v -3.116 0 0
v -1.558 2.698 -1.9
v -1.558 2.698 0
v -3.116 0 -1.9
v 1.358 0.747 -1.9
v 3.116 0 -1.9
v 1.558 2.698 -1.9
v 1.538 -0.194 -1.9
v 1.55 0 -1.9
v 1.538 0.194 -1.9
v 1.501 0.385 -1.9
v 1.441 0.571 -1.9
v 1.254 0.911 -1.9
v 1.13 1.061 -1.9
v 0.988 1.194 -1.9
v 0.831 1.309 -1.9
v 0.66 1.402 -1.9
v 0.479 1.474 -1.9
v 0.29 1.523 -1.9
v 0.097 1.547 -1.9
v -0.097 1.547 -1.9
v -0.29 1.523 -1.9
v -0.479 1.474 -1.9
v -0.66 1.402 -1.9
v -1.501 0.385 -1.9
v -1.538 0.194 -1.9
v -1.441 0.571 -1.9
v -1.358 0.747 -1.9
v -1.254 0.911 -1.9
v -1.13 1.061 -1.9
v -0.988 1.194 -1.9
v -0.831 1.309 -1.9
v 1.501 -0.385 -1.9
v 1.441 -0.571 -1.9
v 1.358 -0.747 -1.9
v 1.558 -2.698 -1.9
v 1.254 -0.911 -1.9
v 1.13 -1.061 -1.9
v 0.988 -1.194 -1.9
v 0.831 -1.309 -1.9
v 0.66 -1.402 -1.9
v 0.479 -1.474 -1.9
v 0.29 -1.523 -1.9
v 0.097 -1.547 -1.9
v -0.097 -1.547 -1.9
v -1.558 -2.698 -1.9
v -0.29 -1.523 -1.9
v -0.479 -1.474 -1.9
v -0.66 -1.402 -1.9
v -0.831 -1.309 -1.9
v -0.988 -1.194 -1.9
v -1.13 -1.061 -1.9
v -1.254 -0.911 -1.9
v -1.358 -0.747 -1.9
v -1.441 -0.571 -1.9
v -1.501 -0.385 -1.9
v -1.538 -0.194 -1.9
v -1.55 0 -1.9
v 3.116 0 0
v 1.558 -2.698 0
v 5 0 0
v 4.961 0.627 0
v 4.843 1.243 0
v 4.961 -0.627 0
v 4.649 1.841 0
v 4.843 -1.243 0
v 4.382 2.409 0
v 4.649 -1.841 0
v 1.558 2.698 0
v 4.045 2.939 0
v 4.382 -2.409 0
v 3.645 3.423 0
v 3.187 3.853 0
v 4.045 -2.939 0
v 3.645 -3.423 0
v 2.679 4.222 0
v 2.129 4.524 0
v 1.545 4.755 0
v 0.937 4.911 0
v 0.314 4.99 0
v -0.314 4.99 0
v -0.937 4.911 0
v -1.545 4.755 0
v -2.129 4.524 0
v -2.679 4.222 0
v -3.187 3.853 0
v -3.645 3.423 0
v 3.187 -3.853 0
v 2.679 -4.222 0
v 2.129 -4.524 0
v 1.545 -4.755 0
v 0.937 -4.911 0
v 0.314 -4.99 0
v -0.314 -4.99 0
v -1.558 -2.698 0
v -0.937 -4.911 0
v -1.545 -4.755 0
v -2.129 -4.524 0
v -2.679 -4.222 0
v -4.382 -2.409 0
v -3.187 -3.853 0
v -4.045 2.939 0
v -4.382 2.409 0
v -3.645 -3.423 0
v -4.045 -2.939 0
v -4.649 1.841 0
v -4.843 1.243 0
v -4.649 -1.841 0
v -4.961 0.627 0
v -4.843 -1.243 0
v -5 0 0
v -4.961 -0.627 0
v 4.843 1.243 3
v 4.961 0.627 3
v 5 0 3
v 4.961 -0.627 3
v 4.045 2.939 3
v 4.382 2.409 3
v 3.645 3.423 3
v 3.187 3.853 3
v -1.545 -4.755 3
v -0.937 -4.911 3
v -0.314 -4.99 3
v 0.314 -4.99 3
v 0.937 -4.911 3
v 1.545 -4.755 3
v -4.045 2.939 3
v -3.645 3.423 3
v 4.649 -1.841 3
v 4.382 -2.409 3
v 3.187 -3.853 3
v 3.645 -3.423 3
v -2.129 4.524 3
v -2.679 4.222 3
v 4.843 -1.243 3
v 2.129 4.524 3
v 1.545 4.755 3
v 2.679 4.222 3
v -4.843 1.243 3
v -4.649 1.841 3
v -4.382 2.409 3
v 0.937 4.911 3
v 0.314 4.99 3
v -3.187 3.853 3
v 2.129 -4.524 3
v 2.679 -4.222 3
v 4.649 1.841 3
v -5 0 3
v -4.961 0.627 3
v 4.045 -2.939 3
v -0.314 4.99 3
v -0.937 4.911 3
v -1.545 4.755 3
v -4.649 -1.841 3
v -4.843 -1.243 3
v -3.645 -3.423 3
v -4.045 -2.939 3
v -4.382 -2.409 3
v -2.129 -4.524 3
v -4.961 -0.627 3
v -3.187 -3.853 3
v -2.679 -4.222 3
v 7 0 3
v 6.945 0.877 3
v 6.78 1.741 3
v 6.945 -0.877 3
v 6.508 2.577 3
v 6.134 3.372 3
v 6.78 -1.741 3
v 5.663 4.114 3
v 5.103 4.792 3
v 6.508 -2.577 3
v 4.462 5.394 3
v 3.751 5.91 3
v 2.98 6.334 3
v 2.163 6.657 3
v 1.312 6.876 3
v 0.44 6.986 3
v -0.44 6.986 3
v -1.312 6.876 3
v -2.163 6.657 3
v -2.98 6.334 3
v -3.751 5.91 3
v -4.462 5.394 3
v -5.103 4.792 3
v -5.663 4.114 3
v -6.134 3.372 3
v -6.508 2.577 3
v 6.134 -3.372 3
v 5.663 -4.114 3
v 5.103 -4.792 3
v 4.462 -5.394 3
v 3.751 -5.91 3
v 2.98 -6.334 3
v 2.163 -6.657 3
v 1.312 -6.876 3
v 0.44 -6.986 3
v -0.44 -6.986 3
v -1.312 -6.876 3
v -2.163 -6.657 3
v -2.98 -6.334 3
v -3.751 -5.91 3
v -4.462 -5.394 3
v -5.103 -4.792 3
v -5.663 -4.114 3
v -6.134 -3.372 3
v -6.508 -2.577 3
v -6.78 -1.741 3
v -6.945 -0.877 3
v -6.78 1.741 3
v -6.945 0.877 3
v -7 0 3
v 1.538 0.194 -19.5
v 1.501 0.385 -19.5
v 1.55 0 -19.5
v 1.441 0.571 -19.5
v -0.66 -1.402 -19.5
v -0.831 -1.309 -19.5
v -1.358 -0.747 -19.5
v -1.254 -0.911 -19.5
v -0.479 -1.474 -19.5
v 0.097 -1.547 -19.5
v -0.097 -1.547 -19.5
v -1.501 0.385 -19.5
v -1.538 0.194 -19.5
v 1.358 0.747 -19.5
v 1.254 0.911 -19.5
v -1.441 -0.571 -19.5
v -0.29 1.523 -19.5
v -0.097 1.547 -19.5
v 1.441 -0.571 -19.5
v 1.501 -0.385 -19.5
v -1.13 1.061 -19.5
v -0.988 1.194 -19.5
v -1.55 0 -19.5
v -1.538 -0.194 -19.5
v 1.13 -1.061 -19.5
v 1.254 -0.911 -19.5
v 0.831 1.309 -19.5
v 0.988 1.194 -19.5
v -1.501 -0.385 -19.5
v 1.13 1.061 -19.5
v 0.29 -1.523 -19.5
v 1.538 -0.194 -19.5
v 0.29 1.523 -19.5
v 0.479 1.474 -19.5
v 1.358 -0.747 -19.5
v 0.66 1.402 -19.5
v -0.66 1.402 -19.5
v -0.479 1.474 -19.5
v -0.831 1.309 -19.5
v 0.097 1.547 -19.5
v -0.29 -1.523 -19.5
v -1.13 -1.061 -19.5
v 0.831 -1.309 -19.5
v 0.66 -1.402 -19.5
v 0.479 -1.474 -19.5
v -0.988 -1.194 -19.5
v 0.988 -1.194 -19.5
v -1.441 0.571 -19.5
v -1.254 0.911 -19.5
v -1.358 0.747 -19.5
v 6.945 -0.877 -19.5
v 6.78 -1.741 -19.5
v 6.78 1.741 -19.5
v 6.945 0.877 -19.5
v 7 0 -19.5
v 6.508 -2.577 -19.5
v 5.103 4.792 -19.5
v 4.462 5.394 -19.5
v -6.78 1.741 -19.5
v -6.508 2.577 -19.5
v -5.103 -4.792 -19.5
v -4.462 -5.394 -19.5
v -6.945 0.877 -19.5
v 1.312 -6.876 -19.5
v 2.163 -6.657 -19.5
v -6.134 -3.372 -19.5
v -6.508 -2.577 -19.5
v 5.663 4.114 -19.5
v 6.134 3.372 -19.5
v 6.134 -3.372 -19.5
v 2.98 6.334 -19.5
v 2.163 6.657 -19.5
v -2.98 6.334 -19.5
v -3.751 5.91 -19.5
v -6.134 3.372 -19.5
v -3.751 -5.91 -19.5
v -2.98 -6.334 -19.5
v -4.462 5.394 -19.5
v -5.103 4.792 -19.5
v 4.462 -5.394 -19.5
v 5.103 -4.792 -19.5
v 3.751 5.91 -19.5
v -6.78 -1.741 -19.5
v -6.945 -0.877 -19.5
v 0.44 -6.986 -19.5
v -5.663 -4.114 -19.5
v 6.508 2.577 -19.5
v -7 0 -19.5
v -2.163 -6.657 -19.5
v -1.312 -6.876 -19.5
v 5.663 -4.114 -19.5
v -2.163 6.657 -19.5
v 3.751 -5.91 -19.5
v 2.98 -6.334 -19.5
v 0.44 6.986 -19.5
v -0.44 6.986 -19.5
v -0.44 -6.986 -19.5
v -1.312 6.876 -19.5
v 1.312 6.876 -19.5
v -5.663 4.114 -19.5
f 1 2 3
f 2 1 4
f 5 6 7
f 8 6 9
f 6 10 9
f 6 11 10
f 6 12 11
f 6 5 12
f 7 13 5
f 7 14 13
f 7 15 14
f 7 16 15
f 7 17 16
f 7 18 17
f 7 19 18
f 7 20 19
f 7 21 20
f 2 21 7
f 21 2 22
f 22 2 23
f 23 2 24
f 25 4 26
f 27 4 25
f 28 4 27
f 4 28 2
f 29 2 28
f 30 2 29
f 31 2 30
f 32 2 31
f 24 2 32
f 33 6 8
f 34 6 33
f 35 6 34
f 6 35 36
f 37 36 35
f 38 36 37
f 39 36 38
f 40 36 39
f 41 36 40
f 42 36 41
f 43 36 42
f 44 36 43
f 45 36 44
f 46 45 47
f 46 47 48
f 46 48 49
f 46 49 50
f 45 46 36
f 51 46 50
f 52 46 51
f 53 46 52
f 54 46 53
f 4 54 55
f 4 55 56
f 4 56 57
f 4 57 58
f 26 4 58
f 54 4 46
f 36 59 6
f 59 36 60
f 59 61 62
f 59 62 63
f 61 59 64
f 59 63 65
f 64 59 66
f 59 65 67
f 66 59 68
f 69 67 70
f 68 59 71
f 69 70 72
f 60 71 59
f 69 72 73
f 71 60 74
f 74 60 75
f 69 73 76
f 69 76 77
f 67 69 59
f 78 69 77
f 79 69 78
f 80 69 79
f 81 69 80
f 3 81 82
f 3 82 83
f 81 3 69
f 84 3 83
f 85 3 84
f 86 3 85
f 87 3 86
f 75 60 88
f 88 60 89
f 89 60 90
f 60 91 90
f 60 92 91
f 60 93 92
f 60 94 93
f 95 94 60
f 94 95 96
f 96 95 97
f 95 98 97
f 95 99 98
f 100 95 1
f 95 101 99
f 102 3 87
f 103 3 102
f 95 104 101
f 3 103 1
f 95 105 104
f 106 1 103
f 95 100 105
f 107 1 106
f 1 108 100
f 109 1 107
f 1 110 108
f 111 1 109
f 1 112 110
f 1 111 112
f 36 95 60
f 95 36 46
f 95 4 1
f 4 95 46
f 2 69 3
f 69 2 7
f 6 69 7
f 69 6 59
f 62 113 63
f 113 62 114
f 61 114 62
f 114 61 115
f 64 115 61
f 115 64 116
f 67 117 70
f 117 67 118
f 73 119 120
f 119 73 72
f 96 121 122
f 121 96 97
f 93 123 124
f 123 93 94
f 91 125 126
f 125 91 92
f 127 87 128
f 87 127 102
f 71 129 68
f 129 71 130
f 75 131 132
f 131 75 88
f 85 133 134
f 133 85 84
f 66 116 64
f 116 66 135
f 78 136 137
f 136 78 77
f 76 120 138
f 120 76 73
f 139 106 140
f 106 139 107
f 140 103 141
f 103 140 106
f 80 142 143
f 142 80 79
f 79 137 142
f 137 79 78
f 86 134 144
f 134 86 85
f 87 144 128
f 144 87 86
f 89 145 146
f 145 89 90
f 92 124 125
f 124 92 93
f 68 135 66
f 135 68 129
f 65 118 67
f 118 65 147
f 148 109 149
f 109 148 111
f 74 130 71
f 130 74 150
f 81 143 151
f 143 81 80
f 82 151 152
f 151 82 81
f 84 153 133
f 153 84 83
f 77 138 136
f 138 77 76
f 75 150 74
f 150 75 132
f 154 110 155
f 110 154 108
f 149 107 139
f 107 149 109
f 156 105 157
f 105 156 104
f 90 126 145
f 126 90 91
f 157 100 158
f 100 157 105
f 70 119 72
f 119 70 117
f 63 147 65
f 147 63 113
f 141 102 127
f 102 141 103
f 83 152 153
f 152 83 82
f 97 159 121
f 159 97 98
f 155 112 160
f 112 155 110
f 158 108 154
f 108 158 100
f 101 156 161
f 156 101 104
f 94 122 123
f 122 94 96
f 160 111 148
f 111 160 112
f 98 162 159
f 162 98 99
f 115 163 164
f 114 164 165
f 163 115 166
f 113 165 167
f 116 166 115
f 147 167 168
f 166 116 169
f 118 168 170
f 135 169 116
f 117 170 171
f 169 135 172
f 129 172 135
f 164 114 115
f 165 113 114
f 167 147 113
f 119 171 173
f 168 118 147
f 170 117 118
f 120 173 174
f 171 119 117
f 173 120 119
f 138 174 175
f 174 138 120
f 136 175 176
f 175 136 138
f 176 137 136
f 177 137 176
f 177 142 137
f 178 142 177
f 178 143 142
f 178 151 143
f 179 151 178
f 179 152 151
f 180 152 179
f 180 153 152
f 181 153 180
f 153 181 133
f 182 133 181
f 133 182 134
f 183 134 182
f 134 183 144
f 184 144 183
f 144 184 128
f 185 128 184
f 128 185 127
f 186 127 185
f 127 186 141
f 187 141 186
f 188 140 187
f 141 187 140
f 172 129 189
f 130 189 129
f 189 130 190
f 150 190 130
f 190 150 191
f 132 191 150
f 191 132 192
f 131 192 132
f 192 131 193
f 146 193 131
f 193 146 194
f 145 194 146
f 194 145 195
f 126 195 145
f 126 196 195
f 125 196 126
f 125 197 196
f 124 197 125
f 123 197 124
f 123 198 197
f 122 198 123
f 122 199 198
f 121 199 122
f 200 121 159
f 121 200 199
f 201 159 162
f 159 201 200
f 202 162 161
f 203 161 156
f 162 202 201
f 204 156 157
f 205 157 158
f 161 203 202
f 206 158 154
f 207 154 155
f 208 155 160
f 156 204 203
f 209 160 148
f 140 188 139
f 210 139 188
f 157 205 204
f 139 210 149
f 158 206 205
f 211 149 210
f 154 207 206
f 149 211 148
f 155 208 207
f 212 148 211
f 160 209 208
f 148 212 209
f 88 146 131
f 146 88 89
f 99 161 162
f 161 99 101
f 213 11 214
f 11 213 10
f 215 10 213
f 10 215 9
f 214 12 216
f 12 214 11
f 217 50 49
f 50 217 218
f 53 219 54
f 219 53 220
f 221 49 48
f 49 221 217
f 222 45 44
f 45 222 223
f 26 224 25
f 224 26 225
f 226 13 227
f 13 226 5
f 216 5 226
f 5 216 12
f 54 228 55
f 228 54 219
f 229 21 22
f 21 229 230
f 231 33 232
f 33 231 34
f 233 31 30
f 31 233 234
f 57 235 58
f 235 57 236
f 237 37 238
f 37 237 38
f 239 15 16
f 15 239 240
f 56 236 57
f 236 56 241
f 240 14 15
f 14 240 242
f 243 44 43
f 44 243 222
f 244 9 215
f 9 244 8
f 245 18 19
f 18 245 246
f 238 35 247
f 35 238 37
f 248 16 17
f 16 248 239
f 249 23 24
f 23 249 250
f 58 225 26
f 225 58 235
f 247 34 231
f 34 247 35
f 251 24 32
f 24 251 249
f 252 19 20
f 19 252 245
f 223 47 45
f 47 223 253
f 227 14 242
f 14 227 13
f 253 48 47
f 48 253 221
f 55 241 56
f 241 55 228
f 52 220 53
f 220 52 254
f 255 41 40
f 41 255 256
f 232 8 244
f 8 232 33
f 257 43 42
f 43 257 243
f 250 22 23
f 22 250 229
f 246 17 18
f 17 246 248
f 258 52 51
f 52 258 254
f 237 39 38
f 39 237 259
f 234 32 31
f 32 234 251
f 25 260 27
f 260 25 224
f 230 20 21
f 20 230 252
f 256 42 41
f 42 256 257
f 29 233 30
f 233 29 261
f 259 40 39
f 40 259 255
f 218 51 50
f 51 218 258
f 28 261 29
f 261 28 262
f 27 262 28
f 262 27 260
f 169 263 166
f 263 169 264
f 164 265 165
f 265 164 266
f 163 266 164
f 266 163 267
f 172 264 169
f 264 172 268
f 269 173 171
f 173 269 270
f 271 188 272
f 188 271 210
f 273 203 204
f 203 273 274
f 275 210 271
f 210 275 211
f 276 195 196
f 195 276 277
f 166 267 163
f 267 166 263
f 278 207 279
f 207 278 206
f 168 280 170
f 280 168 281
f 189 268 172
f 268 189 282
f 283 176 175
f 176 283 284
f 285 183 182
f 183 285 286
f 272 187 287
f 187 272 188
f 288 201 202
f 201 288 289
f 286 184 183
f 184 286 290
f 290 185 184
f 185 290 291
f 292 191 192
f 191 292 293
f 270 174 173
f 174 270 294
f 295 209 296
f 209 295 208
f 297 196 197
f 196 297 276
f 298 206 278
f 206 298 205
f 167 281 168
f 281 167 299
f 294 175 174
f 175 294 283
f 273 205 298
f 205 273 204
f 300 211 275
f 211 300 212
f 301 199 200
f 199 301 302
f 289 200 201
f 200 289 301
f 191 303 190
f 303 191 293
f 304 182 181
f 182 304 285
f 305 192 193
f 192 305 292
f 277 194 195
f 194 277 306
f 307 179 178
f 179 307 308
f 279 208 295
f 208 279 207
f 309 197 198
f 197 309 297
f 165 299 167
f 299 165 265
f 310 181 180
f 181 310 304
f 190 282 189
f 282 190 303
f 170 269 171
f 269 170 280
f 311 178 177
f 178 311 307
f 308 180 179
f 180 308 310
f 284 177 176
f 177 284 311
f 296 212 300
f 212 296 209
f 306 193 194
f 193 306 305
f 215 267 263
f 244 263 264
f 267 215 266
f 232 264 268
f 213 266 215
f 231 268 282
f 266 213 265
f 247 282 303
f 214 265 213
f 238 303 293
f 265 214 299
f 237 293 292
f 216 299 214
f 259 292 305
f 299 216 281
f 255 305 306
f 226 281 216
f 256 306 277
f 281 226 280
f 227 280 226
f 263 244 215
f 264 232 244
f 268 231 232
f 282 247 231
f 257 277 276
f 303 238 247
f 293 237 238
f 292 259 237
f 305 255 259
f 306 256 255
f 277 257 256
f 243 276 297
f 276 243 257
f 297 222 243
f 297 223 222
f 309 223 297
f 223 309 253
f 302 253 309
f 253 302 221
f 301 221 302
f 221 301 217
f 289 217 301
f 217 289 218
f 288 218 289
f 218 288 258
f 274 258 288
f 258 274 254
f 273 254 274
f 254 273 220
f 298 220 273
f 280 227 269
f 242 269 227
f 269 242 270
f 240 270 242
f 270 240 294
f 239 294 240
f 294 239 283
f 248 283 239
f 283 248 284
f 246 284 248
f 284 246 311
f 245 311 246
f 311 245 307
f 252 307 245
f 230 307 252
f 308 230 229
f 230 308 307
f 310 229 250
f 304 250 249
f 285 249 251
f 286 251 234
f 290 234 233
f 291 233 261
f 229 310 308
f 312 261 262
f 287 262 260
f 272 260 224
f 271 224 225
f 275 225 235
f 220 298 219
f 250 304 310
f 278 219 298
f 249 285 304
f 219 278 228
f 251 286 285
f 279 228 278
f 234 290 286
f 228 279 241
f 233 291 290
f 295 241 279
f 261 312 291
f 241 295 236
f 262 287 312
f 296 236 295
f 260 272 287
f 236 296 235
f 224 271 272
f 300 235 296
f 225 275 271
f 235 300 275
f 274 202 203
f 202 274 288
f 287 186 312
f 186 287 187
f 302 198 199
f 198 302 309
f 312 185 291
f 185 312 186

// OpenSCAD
$fn = 50;


difference() {
	union() {
		translate(v = [0, 0, -19.5000000000]) {
			cylinder(h = 22.5000000000, r = 7.0000000000);
		}
	}
	union() {
		translate(v = [0, 0, 0]) {
			rotate(a = [0, 0, 0]) {
				difference() {
					union() {
						translate(v = [0, 0, -1.9000000000]) {
							linear_extrude(height = 1.9000000000) {
								polygon(points = [[3.1158000000, 0.0000000000], [1.5579000000, 2.6983619531], [-1.5579000000, 2.6983619531], [-3.1158000000, 0.0000000000], [-1.5579000000, -2.6983619531], [1.5579000000, -2.6983619531]]);
							}
						}
					}
					union();
				}
			}
		}
		#cylinder(h = 3, r = 5.0000000000);
		#translate(v = [0, 0, -100.0000000000]) {
			cylinder(h = 200, r = 1.5500000000);
		}
	}
}
